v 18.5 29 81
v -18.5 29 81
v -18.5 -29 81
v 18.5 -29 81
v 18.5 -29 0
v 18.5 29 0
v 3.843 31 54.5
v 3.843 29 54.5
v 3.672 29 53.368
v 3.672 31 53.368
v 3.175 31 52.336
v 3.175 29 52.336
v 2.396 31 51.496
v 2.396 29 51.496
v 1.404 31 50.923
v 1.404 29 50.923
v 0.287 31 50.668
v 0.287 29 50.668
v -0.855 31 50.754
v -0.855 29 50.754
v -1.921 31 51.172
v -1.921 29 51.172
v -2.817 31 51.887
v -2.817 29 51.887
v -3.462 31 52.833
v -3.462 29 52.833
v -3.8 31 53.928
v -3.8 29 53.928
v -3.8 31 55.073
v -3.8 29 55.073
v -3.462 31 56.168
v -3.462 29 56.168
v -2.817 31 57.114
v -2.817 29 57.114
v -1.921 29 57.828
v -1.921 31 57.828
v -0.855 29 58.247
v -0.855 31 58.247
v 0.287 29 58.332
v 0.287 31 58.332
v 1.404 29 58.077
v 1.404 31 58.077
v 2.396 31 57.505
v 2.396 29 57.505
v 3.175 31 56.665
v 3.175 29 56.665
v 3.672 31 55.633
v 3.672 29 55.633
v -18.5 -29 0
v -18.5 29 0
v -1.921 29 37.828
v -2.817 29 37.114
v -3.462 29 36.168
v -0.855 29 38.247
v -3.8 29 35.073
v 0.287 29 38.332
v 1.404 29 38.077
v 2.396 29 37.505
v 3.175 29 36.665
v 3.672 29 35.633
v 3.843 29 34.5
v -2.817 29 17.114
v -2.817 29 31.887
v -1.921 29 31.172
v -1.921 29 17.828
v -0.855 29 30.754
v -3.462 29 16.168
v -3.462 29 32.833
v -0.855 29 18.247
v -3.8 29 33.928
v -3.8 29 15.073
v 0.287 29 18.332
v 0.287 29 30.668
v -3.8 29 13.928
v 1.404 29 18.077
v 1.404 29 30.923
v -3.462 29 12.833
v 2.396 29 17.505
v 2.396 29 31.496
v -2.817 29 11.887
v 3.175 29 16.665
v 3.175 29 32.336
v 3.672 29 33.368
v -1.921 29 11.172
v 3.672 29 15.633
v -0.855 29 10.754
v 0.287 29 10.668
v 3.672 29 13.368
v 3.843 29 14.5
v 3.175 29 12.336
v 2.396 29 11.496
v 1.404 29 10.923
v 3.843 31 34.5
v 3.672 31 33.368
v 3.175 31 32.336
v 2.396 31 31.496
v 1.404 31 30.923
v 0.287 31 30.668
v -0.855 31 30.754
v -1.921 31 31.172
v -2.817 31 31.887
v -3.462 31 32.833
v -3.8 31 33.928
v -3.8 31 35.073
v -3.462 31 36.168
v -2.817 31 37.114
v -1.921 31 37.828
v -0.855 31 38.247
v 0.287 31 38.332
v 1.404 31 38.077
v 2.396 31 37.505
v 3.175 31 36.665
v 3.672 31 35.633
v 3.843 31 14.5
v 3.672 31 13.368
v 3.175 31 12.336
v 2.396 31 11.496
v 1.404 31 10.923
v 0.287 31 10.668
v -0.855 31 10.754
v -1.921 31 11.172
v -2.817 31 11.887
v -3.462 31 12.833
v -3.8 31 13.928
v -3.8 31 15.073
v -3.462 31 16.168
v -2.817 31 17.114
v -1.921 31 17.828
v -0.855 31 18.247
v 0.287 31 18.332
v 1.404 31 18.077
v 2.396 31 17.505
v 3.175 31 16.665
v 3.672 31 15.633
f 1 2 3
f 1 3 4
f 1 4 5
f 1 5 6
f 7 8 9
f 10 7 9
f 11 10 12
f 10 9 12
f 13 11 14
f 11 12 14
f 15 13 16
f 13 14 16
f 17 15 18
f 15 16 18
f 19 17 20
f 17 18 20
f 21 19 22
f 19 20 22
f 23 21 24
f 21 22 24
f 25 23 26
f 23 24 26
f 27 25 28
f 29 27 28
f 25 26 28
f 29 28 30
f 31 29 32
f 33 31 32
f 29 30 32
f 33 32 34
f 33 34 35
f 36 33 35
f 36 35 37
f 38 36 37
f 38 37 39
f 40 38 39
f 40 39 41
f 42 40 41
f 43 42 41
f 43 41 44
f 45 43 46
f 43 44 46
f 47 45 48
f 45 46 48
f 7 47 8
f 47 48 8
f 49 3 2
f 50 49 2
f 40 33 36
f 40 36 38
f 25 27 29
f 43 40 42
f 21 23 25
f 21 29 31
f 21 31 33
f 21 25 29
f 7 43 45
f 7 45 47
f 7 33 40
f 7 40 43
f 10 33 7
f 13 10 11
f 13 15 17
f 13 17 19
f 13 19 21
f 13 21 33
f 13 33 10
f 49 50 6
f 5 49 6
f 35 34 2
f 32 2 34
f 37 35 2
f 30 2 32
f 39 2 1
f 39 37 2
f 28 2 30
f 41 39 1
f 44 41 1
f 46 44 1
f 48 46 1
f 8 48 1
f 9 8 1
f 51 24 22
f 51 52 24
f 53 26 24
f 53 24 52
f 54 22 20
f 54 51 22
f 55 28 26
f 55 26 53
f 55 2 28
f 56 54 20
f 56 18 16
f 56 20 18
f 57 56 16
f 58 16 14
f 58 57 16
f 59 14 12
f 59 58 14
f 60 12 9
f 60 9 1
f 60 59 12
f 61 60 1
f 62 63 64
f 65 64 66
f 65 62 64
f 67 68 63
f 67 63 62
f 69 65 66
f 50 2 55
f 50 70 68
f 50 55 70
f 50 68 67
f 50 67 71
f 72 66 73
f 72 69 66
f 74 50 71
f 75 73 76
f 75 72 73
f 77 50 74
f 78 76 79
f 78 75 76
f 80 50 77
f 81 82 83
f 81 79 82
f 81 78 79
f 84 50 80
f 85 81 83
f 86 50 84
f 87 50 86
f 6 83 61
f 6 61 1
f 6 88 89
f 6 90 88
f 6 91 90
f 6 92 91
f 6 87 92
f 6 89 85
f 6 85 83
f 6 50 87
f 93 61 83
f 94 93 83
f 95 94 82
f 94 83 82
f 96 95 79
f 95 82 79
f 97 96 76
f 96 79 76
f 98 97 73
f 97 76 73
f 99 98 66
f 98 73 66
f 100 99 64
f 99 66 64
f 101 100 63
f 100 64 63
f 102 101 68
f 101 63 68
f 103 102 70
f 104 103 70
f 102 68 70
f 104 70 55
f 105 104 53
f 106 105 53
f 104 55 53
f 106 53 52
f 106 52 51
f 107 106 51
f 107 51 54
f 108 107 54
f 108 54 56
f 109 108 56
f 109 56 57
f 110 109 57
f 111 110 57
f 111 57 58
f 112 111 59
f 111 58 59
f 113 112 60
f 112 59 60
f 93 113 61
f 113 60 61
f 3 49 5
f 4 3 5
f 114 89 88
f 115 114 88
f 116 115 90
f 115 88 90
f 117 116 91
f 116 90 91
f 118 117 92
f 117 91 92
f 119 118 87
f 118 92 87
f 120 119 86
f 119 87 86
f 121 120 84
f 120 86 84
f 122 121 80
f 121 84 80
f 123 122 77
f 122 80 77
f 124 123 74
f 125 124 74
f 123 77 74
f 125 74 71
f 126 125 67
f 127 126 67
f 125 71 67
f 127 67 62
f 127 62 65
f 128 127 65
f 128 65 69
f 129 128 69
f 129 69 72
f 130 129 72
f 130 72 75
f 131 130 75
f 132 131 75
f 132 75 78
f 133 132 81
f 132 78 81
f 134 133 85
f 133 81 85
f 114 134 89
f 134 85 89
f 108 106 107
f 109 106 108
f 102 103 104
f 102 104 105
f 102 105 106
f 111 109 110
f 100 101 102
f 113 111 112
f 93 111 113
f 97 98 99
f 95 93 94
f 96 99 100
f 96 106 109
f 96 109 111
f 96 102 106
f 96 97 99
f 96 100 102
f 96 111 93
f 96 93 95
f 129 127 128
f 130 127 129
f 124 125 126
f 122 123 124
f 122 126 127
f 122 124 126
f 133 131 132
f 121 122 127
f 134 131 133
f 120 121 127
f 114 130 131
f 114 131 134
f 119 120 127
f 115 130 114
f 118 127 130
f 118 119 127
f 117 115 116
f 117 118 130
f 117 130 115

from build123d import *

# Parameters (mm, degrees)
SKETCH_1_W      = 37
SKETCH_1_H      = 58
EXTRUDE_1_DEPTH = 81
SKETCH_3_R      = 3.842727579
EXTRUDE_2_DEPTH = 2


with BuildPart() as part:
    # 草图1 → 凸台-拉伸1 (new body)
    with BuildSketch(Plane.XY):
        Rectangle(SKETCH_1_W, SKETCH_1_H)
    extrude(amount=EXTRUDE_1_DEPTH)

    # 草图3 → 凸台-拉伸2 (add)
    with BuildSketch(Plane(origin=(0, 29, 0), x_dir=(1, 0, 0), z_dir=(0, 1, 0))):
        with Locations((0, -14.500282865)):
            Circle(SKETCH_3_R)
        with Locations((0, -34.500282865)):
            Circle(SKETCH_3_R)
        with Locations((0, -54.500282865)):
            Circle(SKETCH_3_R)
    extrude(amount=EXTRUDE_2_DEPTH)


solid = part.part
